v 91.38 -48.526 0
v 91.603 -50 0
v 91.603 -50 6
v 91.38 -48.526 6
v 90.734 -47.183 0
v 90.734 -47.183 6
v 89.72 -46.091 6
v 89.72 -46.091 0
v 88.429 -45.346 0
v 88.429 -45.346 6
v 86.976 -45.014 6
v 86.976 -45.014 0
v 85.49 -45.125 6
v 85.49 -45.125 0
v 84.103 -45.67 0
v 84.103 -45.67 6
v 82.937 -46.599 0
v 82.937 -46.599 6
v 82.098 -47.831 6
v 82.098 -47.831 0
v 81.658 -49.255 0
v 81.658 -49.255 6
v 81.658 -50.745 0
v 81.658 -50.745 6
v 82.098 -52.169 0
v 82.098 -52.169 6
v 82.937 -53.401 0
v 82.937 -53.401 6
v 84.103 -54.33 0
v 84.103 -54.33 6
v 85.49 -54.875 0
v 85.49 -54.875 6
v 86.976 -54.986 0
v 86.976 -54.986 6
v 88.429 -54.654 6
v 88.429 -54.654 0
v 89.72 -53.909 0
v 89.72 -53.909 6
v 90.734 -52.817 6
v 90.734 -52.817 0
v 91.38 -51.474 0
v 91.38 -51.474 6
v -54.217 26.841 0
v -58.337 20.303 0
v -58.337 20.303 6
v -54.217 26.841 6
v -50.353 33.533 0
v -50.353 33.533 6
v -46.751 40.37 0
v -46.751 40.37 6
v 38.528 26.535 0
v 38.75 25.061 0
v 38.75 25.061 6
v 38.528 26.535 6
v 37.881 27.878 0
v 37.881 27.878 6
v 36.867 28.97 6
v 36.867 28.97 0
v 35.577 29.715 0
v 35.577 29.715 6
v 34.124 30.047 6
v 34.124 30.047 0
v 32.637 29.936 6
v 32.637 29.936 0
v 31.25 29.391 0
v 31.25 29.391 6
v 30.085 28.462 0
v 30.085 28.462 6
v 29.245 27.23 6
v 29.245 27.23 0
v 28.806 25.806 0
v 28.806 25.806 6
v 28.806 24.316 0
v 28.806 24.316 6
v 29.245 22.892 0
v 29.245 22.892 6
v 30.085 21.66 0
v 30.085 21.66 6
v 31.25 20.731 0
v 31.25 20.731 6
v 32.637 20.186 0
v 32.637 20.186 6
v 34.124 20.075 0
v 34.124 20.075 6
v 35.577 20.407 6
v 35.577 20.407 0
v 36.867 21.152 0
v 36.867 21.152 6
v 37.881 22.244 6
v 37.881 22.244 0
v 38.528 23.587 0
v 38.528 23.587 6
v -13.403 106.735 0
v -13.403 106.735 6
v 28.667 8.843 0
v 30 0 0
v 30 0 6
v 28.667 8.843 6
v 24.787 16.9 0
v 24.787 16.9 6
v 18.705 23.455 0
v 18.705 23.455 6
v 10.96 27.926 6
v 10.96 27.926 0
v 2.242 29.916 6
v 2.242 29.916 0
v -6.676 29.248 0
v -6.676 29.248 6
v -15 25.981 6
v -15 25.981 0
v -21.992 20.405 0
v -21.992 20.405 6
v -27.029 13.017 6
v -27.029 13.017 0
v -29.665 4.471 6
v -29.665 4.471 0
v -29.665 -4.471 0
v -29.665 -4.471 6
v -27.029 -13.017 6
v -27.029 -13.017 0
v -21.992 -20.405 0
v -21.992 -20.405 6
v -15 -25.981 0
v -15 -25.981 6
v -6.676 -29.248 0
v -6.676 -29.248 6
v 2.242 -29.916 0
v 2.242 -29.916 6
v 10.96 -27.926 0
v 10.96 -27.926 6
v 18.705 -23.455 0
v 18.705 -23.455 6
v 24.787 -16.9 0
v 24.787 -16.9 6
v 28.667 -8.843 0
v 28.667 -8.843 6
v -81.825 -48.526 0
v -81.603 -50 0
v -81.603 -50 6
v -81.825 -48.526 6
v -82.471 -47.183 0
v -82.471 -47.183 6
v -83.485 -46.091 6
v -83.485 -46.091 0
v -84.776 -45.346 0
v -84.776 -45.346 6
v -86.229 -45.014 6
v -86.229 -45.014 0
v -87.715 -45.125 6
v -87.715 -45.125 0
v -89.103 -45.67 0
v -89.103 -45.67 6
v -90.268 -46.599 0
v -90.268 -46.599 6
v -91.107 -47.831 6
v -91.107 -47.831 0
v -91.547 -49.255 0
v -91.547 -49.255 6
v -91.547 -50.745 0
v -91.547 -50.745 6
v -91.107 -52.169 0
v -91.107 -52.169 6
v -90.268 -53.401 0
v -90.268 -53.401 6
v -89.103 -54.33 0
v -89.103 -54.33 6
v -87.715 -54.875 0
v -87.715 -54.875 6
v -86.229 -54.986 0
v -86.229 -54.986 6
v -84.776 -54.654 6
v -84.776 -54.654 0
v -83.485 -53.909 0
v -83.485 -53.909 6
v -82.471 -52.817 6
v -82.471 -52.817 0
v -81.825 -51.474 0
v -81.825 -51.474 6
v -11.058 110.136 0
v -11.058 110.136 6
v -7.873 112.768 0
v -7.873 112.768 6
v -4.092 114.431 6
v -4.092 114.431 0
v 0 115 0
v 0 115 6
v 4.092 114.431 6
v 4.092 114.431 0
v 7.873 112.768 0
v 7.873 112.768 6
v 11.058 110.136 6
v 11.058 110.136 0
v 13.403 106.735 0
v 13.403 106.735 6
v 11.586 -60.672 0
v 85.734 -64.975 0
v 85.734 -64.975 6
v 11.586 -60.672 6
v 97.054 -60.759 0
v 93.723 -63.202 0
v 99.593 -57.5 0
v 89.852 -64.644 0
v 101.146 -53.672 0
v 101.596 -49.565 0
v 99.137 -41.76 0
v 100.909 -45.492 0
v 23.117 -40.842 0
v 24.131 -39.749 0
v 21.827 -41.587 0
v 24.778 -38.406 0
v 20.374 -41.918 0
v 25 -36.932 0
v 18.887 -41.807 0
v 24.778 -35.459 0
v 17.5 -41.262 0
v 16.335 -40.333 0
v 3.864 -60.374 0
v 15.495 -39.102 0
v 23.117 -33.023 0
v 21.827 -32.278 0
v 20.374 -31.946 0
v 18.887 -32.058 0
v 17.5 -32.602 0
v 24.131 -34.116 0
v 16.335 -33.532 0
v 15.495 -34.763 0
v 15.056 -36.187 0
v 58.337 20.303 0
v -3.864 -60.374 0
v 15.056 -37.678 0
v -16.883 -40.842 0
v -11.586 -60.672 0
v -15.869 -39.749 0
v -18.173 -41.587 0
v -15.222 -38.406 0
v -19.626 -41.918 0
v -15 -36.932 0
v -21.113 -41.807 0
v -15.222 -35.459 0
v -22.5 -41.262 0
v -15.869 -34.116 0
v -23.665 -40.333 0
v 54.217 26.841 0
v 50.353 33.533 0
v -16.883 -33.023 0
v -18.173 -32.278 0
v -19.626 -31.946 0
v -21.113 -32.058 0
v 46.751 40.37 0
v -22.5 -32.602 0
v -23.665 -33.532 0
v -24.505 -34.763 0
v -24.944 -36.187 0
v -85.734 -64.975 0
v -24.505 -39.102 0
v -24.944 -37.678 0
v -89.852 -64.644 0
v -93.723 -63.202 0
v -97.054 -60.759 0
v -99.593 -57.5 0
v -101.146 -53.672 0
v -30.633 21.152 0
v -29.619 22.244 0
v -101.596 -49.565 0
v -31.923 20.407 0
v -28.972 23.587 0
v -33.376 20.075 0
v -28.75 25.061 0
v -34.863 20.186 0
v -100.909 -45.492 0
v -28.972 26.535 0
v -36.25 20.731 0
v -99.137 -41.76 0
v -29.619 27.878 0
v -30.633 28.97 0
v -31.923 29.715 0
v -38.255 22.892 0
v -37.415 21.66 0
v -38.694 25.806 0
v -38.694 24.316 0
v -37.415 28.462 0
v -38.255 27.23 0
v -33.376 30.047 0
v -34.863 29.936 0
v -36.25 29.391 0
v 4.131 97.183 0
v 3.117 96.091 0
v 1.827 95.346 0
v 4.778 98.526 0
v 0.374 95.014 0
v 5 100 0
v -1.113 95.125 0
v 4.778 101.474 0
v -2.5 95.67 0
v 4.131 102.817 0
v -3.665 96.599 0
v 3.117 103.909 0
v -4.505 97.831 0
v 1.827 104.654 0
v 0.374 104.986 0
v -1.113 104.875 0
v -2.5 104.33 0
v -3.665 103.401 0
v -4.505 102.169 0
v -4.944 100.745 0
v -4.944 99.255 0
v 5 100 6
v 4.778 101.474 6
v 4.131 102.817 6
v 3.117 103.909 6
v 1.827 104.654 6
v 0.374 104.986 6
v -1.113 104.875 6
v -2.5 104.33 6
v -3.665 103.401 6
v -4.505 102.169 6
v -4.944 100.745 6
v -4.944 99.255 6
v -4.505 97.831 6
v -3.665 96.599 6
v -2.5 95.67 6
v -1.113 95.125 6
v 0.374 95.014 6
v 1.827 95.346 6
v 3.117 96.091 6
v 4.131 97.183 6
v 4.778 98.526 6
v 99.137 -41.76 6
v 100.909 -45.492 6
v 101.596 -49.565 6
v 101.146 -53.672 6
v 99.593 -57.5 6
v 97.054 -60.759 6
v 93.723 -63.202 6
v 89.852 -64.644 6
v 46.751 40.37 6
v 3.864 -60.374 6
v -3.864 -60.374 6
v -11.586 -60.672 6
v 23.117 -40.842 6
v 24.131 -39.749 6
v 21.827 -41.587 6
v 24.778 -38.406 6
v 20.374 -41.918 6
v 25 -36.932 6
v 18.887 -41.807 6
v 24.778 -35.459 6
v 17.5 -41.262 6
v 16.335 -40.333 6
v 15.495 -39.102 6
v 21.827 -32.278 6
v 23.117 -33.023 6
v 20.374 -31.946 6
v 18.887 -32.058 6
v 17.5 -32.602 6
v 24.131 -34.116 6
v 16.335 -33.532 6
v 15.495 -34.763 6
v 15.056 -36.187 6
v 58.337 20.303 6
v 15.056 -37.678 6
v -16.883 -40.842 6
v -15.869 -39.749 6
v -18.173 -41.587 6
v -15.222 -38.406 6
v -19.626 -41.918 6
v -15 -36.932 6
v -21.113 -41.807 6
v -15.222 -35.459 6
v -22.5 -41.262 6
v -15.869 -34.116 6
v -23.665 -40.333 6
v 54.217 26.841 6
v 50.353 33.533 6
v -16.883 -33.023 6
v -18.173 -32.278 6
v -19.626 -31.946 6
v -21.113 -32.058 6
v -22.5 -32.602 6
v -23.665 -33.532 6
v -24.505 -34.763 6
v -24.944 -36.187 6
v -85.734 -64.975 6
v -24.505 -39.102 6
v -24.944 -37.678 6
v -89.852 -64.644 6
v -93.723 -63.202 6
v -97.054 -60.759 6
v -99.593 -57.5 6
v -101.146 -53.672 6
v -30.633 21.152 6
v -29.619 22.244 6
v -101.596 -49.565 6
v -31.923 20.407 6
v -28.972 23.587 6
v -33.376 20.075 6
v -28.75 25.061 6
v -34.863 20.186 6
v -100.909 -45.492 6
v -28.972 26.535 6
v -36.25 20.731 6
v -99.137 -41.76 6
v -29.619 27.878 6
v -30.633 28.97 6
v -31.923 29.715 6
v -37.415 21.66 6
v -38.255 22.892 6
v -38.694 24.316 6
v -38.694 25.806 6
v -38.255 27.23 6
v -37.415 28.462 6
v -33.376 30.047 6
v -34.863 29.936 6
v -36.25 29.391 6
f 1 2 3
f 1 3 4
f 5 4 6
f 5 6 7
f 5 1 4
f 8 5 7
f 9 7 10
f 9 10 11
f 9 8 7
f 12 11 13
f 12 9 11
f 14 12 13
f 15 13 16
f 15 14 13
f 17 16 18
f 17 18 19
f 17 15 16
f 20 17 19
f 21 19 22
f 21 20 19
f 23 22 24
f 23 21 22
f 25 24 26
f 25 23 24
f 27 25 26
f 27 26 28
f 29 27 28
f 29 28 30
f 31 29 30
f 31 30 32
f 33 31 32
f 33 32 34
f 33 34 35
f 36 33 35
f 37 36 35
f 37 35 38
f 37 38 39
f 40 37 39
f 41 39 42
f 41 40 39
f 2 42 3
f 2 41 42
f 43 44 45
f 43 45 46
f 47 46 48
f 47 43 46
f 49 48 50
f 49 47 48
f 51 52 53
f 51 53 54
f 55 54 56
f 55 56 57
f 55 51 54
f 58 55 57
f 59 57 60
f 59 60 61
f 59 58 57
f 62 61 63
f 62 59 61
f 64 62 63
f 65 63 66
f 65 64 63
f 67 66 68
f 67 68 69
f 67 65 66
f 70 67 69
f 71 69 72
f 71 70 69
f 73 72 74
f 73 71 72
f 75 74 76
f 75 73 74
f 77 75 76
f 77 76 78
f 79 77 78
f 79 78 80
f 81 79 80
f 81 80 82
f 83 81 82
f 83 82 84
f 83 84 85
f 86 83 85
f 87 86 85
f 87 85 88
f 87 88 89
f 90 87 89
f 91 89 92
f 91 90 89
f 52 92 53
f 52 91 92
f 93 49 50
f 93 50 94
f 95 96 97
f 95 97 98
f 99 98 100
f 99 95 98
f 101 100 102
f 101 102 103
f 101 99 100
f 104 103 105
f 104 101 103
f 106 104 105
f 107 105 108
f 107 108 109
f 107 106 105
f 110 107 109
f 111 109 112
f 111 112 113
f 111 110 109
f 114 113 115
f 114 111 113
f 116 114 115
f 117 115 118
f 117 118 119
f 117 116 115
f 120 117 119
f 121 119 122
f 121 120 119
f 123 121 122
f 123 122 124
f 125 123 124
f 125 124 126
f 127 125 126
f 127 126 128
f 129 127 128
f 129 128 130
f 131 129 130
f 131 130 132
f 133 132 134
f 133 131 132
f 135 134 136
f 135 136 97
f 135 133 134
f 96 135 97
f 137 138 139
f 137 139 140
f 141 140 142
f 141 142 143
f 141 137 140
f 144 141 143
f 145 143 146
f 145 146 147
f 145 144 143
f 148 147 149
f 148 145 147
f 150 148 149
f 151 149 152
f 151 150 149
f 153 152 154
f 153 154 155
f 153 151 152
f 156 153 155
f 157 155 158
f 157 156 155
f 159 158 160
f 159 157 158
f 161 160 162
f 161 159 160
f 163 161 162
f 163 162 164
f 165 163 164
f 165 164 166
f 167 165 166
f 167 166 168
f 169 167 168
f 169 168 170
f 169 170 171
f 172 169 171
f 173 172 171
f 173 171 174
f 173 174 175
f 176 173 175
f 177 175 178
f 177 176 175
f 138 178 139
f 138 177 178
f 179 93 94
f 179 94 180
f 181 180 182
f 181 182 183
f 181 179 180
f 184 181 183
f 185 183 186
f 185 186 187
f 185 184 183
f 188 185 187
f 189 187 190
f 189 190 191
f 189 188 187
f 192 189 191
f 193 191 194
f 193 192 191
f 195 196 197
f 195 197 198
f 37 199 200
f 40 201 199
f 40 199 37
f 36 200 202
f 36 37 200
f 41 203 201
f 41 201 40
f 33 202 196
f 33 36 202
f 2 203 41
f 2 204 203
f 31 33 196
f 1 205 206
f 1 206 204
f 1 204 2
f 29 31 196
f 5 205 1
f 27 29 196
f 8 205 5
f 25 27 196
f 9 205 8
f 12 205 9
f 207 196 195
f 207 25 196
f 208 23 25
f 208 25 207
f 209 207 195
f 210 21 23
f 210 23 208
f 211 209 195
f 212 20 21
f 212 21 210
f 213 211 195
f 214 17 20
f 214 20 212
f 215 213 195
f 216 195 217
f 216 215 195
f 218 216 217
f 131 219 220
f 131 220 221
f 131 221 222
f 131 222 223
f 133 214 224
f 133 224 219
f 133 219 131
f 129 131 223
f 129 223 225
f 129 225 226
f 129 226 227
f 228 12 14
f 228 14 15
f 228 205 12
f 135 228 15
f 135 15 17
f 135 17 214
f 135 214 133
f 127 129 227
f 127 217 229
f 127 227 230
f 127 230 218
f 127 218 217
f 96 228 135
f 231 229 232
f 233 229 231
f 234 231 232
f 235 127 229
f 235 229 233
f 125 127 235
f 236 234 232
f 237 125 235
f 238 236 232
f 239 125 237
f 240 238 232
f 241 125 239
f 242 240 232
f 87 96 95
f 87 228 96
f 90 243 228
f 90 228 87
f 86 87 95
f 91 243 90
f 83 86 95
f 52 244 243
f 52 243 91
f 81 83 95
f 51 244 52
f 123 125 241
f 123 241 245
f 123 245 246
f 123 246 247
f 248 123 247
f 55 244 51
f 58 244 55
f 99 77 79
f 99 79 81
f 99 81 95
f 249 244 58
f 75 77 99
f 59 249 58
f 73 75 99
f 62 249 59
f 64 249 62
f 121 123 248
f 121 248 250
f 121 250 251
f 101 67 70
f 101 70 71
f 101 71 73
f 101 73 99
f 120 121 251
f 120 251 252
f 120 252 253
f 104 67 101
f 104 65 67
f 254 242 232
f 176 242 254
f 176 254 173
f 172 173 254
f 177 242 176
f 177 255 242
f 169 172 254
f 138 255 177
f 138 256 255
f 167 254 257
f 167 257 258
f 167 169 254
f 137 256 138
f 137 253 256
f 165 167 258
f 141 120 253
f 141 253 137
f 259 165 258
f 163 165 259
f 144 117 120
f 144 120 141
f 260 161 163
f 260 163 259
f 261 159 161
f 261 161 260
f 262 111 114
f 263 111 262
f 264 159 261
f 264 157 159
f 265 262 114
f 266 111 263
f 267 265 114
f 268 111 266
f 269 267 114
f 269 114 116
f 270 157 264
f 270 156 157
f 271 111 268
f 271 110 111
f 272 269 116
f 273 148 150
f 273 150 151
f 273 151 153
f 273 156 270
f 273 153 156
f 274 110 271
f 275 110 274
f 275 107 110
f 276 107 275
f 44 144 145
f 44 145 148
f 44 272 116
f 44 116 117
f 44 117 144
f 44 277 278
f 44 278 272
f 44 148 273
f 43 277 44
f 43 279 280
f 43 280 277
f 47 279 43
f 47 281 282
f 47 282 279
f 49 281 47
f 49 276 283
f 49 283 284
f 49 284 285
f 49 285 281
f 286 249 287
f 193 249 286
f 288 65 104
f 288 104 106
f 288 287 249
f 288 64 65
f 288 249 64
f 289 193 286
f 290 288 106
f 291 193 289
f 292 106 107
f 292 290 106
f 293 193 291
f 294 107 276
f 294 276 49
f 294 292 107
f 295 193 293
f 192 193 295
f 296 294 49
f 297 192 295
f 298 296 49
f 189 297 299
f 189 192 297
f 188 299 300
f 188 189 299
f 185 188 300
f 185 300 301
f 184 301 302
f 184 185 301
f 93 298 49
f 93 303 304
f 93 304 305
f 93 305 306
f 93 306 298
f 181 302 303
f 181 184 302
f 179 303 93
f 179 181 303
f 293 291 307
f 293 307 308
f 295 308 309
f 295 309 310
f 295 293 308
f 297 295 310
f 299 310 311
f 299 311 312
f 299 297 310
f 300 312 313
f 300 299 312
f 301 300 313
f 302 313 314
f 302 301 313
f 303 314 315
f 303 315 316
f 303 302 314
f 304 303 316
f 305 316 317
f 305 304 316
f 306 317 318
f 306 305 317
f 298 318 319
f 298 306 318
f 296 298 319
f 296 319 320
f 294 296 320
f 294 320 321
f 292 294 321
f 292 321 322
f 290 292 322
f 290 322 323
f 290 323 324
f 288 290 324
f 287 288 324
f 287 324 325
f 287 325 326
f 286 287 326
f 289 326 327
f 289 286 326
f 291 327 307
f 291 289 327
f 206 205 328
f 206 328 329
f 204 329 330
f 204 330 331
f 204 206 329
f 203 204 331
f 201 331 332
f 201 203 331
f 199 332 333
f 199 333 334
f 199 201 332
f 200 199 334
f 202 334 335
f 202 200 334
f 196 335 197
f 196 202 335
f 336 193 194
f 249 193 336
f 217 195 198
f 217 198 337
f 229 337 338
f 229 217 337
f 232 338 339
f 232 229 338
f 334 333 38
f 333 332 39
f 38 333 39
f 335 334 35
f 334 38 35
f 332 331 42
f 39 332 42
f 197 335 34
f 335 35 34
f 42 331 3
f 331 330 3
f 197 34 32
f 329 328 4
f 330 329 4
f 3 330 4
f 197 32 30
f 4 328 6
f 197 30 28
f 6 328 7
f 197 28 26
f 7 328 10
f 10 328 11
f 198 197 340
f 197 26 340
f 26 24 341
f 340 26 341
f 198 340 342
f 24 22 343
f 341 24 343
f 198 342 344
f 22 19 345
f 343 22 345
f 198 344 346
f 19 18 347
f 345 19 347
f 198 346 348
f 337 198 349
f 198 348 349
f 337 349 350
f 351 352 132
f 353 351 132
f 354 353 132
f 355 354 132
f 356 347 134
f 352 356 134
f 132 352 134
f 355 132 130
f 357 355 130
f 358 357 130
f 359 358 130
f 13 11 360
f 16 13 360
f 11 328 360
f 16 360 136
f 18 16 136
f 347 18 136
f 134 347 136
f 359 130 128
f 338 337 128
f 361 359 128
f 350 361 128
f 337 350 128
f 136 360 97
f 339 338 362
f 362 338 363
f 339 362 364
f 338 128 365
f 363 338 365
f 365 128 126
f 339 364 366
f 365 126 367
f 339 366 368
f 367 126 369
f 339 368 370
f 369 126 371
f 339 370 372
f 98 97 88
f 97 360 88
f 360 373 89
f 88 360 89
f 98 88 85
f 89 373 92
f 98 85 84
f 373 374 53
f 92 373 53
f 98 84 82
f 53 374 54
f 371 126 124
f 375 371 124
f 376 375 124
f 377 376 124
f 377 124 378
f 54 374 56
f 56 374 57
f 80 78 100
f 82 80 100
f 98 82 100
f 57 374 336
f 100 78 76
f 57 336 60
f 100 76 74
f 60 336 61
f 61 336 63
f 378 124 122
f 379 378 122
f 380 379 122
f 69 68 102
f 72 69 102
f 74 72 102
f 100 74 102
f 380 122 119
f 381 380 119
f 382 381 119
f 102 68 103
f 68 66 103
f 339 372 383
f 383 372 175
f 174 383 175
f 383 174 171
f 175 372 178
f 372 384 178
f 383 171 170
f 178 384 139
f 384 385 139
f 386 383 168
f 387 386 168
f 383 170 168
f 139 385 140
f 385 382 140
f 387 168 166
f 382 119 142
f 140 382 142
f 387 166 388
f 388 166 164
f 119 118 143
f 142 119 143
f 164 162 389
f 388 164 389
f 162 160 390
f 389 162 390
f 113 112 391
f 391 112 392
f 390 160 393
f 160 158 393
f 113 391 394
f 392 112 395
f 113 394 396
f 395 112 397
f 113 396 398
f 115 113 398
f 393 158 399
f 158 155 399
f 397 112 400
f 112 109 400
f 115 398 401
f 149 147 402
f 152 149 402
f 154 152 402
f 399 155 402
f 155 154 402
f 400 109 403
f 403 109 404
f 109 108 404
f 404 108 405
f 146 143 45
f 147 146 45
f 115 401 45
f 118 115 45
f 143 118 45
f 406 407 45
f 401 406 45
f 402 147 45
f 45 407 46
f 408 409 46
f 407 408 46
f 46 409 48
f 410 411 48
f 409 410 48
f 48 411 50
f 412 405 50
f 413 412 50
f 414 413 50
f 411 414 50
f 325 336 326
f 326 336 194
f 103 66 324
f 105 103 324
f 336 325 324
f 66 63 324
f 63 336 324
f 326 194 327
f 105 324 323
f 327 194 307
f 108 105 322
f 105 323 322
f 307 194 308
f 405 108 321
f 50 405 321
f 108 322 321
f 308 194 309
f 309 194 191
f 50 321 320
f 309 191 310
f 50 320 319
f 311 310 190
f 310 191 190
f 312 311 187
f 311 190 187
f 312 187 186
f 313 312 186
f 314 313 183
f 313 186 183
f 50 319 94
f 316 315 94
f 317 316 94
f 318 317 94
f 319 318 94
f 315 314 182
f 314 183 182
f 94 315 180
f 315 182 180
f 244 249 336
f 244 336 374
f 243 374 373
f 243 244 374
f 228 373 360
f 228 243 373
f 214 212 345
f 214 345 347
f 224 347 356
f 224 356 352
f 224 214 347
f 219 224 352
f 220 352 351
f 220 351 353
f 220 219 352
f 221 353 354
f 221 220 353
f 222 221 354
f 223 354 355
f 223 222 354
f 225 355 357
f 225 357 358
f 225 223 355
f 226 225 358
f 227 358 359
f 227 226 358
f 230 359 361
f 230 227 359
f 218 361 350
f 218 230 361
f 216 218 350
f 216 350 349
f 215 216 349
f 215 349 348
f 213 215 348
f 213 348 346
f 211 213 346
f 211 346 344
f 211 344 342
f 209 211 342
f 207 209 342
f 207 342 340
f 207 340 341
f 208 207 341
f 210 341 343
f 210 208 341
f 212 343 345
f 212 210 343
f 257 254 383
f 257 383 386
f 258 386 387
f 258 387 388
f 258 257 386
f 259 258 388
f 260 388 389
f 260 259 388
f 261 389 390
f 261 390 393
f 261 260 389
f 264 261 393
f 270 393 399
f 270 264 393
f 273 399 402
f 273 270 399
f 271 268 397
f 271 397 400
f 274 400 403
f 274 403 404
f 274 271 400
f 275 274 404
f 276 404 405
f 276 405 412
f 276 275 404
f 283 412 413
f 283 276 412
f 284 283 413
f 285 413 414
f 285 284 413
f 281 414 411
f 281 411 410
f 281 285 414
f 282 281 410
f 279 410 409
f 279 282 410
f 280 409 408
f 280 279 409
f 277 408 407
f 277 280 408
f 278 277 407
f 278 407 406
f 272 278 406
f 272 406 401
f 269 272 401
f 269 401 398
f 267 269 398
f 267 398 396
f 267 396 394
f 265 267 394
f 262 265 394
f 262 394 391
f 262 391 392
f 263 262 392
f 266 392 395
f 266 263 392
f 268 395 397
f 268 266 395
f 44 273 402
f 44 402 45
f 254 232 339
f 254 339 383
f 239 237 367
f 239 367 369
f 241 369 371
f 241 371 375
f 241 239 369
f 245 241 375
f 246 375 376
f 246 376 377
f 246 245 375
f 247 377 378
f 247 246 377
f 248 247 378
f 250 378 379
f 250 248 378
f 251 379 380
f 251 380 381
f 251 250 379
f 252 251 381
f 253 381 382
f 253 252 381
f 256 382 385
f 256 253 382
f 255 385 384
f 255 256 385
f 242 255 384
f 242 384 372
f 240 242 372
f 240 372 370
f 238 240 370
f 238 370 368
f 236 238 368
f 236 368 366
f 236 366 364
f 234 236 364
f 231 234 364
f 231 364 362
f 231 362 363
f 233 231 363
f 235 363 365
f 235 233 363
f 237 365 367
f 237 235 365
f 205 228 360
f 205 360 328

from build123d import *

# Parameters (mm, degrees)
SKETCH1_R           = 5
SKETCH1_R_2         = 30
BOSS_EXTRUDE1_DEPTH = 6


with BuildPart() as part:
    # Sketch1 → Boss-Extrude1 (new body)
    with BuildSketch(Plane.XY):
        with BuildLine():
            Line((-99.136639798, -41.760075744), (-58.33663034, 20.302554811))
            ThreePointArc((-58.33663034, 20.302554811), (-52.252875179, 30.168211551), (-46.750843398, 40.36972644))
            Line((-46.750843398, 40.36972644), (-13.40303344, 106.734886383))
            ThreePointArc((-13.40303344, 106.734886383), (0, 115), (13.40303344, 106.734886383))
            Line((13.40303344, 106.734886383), (46.750843398, 40.36972644))
            ThreePointArc((46.750843398, 40.36972644), (52.252875179, 30.168211551), (58.33663034, 20.302554811))
            Line((58.33663034, 20.302554811), (99.136639798, -41.760075744))
            ThreePointArc((99.136639798, -41.760075744), (99.592921435, -57.5), (85.733606358, -64.974810639))
            Line((85.733606358, -64.974810639), (11.585786942, -60.672281251))
            ThreePointArc((11.585786942, -60.672281251), (0, -60.336423102), (-11.585786942, -60.672281251))
            Line((-11.585786942, -60.672281251), (-85.733606358, -64.974810639))
            ThreePointArc((-85.733606358, -64.974810639), (-99.592921435, -57.5), (-99.136639798, -41.760075744))
        make_face()
        with Locations((0, 100)):
            Circle(SKETCH1_R, mode=Mode.SUBTRACT)
        with Locations((86.602540378, -50)):
            Circle(SKETCH1_R, mode=Mode.SUBTRACT)
        with Locations((-86.602540378, -50)):
            Circle(SKETCH1_R, mode=Mode.SUBTRACT)
        Circle(SKETCH1_R_2, mode=Mode.SUBTRACT)
        with Locations((-33.75, 25.061076609)):
            Circle(SKETCH1_R, mode=Mode.SUBTRACT)
        with Locations((33.75, 25.061076609)):
            Circle(SKETCH1_R, mode=Mode.SUBTRACT)
        with Locations((-20, -36.932370625)):
            Circle(SKETCH1_R, mode=Mode.SUBTRACT)
        with Locations((20, -36.932370625)):
            Circle(SKETCH1_R, mode=Mode.SUBTRACT)
    extrude(amount=BOSS_EXTRUDE1_DEPTH)


solid = part.part
